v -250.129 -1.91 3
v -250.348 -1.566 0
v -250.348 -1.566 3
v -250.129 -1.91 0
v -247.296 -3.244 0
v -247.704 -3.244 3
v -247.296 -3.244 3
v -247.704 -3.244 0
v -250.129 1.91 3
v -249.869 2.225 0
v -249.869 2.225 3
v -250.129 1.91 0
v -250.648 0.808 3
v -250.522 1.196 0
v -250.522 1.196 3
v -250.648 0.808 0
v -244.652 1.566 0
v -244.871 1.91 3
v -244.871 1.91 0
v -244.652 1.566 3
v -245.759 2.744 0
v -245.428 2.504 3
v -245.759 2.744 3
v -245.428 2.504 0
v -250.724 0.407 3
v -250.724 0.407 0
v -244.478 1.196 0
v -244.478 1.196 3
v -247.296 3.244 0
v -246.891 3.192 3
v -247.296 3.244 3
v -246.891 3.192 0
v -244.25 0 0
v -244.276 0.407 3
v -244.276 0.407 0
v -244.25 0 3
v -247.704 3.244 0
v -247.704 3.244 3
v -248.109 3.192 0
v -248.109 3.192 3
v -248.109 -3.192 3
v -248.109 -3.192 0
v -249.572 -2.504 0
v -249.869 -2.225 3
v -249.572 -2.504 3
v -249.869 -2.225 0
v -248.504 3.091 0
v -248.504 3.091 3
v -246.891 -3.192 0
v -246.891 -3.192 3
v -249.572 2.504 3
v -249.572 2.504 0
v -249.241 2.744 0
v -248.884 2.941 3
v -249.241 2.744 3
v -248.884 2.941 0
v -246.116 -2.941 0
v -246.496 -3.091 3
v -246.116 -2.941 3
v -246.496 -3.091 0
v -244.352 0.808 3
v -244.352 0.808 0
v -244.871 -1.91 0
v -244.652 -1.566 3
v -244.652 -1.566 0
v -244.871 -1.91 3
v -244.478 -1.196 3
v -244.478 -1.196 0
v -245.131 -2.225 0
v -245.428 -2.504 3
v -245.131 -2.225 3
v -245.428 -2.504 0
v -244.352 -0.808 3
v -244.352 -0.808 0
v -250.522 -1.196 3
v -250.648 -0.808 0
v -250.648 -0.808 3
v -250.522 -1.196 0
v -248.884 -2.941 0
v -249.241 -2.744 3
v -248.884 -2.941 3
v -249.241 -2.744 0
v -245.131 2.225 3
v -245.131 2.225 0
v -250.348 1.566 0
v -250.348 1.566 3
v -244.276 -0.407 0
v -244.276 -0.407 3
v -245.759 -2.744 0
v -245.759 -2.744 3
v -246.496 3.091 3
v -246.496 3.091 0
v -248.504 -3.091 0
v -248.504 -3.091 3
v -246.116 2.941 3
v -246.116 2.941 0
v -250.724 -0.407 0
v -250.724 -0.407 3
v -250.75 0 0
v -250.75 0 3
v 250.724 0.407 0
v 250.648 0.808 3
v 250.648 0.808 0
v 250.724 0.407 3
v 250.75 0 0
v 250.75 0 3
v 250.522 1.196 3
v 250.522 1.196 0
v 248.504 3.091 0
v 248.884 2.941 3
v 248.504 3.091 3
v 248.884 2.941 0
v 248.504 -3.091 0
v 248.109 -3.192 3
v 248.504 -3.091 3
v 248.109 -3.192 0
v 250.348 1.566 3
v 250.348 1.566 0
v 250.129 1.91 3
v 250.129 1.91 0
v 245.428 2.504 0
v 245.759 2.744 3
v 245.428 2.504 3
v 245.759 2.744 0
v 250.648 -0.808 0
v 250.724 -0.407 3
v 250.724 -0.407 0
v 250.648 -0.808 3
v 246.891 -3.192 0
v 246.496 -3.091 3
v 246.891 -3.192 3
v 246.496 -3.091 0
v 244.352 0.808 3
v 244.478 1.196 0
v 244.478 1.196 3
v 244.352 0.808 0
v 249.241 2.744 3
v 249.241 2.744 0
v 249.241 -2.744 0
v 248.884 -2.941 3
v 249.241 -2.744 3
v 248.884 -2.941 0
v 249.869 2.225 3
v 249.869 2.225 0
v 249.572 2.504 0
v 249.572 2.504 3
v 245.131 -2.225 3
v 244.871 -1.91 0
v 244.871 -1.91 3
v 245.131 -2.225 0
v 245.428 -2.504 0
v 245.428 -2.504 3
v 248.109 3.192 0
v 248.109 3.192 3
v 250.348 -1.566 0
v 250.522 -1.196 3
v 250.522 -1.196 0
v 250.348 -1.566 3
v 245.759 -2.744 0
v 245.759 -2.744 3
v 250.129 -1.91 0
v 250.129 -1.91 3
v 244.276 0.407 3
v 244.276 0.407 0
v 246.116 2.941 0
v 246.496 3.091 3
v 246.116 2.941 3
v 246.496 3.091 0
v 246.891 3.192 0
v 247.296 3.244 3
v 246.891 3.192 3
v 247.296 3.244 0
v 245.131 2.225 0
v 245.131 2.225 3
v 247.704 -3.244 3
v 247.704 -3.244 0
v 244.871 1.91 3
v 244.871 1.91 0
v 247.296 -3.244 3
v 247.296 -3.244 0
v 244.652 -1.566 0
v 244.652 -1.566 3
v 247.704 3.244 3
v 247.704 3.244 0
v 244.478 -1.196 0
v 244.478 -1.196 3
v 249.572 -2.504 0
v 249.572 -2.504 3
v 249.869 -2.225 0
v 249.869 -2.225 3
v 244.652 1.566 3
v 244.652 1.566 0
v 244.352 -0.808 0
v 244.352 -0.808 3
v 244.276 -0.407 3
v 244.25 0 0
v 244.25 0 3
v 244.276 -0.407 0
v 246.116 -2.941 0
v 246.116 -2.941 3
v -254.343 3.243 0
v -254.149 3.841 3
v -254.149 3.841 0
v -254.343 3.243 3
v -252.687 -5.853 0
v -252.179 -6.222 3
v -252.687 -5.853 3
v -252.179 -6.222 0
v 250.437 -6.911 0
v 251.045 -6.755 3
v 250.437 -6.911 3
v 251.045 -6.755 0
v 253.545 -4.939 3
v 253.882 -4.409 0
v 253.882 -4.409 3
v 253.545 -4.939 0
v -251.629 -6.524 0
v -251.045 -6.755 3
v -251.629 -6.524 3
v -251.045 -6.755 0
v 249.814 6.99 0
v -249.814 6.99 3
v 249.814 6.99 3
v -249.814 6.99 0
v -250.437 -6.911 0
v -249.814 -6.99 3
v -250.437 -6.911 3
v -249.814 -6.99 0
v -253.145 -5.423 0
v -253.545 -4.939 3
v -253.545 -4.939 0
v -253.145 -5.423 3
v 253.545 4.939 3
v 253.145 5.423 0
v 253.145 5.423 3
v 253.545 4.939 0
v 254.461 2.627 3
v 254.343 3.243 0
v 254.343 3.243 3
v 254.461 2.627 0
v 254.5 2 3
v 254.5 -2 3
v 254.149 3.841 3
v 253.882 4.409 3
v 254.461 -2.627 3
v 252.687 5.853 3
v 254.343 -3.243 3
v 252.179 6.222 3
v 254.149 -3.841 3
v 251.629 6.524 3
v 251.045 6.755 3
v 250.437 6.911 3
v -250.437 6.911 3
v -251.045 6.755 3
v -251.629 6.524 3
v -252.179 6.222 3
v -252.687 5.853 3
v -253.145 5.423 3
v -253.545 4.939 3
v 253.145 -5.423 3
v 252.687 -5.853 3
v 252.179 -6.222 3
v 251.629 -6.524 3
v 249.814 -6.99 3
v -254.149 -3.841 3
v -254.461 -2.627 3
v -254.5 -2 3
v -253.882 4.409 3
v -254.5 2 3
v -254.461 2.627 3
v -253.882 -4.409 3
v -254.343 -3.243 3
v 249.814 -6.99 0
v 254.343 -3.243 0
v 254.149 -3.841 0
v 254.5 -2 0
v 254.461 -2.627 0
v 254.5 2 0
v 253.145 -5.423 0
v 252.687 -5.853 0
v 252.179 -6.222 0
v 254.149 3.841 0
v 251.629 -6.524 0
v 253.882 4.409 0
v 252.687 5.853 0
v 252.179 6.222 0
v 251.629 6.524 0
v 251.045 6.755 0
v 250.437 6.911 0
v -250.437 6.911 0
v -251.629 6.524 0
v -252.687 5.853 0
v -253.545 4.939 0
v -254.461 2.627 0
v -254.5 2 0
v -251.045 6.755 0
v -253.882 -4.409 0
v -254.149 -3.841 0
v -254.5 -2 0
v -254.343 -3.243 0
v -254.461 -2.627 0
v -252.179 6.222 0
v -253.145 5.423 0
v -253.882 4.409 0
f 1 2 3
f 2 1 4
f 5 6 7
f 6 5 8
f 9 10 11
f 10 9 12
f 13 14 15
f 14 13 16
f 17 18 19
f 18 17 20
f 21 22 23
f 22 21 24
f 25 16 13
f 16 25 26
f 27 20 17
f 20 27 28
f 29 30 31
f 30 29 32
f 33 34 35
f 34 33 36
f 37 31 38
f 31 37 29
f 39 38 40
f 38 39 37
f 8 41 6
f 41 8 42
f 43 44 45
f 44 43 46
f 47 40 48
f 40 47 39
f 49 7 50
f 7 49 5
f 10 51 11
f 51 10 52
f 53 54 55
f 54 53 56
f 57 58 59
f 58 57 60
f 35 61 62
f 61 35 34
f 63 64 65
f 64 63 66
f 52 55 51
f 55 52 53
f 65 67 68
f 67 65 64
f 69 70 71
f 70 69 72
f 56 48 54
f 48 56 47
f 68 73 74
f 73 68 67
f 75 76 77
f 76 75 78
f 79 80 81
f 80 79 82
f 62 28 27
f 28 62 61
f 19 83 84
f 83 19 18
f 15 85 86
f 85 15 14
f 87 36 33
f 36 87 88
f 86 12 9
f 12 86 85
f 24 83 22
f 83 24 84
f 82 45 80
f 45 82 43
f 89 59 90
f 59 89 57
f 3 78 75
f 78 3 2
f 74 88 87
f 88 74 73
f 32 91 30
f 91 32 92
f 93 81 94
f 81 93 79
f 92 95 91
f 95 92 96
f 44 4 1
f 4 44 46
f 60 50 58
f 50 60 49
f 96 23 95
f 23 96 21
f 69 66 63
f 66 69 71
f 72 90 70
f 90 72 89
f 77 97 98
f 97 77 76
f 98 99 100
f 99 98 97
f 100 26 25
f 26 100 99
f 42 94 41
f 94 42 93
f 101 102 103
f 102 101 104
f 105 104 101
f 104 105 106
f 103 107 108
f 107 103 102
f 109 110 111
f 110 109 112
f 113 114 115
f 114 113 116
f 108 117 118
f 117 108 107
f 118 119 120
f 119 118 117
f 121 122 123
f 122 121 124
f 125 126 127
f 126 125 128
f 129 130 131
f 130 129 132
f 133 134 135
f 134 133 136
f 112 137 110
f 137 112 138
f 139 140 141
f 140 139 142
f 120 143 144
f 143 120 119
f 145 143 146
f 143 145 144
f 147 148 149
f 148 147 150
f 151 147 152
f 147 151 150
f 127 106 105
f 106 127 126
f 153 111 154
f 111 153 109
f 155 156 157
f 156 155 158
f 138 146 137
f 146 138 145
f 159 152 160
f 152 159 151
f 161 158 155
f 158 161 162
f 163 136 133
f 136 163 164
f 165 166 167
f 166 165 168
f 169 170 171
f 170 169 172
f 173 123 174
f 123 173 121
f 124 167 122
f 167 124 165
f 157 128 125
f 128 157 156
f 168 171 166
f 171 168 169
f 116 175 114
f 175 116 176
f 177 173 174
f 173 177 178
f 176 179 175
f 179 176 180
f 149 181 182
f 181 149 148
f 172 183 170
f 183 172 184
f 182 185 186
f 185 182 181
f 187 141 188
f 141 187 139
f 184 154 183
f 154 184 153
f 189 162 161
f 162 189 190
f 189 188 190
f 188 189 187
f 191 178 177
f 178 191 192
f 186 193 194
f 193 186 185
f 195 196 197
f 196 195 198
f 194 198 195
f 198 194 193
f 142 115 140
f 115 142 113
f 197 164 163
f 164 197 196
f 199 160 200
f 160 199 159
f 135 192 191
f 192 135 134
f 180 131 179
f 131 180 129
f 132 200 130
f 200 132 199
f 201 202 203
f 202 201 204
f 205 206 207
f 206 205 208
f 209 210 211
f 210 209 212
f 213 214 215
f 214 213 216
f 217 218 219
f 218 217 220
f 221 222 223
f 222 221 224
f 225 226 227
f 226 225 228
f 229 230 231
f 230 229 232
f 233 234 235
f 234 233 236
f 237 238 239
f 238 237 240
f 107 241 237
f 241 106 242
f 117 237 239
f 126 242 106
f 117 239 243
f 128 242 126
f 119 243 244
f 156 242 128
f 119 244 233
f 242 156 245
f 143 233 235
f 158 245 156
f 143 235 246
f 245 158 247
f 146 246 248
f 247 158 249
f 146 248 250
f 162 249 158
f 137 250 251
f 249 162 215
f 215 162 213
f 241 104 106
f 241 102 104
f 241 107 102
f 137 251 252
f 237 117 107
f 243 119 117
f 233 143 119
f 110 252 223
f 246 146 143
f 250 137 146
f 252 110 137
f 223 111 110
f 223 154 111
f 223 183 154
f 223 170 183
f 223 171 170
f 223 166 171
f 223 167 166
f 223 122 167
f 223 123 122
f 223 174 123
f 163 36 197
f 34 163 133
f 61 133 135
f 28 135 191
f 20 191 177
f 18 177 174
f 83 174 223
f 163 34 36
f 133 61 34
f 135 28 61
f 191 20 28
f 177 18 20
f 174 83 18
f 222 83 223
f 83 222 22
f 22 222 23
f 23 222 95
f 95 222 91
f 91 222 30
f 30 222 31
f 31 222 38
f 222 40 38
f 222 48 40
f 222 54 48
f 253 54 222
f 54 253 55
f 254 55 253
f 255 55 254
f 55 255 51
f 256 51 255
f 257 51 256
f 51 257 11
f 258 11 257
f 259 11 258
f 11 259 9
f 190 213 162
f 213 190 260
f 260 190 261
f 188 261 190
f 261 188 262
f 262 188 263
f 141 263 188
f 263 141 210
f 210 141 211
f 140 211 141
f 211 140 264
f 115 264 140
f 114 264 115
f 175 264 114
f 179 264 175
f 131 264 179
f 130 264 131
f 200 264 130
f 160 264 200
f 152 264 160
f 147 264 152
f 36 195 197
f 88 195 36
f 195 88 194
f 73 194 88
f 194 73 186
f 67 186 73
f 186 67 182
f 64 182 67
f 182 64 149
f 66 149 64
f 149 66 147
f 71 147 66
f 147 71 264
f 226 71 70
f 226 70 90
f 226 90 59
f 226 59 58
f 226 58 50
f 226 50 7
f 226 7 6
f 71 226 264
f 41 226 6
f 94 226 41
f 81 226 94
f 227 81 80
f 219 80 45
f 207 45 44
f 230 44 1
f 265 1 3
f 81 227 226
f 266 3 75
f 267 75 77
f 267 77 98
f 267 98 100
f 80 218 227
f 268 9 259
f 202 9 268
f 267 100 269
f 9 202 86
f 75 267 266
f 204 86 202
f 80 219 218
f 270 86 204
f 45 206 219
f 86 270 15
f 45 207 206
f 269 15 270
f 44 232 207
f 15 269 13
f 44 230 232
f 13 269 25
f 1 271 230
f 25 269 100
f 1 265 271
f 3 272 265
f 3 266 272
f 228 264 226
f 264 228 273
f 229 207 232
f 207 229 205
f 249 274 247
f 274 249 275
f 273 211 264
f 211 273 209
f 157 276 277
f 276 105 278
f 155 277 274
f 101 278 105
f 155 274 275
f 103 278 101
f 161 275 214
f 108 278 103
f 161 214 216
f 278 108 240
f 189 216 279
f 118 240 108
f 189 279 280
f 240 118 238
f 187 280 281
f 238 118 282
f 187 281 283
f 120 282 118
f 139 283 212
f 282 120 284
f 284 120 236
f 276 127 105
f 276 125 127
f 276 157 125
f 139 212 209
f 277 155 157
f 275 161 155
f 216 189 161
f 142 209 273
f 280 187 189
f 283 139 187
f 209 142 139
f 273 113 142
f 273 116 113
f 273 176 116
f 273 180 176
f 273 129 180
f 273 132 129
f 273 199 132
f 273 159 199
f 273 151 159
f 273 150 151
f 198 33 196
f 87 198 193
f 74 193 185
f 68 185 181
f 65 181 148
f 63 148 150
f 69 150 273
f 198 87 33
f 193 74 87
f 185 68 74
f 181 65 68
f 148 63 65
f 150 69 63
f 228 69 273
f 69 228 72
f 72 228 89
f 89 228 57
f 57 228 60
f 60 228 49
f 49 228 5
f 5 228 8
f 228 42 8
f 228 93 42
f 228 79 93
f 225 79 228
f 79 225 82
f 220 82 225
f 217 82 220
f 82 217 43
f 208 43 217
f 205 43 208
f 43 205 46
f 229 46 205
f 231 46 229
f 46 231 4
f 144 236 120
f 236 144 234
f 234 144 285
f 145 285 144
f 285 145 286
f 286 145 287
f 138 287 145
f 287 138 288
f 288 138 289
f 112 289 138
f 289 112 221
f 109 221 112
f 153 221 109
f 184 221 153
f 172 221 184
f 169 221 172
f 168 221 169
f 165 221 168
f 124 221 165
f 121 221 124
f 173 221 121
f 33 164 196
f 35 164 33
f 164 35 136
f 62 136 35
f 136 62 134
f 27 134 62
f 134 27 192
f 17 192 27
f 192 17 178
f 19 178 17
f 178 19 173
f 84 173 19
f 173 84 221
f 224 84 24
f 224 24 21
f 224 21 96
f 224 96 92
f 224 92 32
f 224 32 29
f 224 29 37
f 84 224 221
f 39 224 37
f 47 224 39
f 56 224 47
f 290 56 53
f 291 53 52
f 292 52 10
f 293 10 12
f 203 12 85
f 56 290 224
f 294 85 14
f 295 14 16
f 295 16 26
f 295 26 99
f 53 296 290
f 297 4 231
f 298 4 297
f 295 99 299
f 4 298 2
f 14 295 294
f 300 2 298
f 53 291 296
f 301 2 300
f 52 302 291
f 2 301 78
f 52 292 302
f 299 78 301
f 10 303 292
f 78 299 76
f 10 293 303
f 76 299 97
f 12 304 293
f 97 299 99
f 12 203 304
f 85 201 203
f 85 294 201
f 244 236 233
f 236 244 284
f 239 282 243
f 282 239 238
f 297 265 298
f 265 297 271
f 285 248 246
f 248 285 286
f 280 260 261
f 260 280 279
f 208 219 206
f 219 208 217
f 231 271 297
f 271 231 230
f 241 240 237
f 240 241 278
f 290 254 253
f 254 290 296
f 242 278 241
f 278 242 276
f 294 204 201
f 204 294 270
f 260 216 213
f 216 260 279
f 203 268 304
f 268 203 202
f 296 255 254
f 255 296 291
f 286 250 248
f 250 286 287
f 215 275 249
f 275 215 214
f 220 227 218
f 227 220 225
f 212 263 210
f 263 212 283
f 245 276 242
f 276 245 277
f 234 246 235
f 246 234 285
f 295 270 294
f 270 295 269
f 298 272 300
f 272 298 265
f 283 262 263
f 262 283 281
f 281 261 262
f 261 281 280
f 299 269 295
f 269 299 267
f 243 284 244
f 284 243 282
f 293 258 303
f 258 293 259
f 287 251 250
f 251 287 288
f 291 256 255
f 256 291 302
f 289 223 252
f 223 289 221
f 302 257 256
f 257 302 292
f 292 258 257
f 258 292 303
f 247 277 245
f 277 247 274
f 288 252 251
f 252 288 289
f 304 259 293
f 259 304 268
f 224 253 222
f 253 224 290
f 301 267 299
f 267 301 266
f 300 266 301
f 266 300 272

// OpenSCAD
$fn = 50;


difference() {
	union() {
		hull() {
			translate(v = [-249.5000000000, 2.0000000000, 0]) {
				cylinder(h = 3, r = 5);
			}
			translate(v = [249.5000000000, 2.0000000000, 0]) {
				cylinder(h = 3, r = 5);
			}
			translate(v = [-249.5000000000, -2.0000000000, 0]) {
				cylinder(h = 3, r = 5);
			}
			translate(v = [249.5000000000, -2.0000000000, 0]) {
				cylinder(h = 3, r = 5);
			}
		}
	}
	union() {
		translate(v = [-247.5000000000, 0.0000000000, -100.0000000000]) {
			cylinder(h = 200, r = 3.2500000000);
		}
		translate(v = [-247.5000000000, 0.0000000000, -100.0000000000]) {
			cylinder(h = 200, r = 3.2500000000);
		}
		translate(v = [247.5000000000, 0.0000000000, -100.0000000000]) {
			cylinder(h = 200, r = 3.2500000000);
		}
		translate(v = [247.5000000000, 0.0000000000, -100.0000000000]) {
			cylinder(h = 200, r = 3.2500000000);
		}
	}
}
